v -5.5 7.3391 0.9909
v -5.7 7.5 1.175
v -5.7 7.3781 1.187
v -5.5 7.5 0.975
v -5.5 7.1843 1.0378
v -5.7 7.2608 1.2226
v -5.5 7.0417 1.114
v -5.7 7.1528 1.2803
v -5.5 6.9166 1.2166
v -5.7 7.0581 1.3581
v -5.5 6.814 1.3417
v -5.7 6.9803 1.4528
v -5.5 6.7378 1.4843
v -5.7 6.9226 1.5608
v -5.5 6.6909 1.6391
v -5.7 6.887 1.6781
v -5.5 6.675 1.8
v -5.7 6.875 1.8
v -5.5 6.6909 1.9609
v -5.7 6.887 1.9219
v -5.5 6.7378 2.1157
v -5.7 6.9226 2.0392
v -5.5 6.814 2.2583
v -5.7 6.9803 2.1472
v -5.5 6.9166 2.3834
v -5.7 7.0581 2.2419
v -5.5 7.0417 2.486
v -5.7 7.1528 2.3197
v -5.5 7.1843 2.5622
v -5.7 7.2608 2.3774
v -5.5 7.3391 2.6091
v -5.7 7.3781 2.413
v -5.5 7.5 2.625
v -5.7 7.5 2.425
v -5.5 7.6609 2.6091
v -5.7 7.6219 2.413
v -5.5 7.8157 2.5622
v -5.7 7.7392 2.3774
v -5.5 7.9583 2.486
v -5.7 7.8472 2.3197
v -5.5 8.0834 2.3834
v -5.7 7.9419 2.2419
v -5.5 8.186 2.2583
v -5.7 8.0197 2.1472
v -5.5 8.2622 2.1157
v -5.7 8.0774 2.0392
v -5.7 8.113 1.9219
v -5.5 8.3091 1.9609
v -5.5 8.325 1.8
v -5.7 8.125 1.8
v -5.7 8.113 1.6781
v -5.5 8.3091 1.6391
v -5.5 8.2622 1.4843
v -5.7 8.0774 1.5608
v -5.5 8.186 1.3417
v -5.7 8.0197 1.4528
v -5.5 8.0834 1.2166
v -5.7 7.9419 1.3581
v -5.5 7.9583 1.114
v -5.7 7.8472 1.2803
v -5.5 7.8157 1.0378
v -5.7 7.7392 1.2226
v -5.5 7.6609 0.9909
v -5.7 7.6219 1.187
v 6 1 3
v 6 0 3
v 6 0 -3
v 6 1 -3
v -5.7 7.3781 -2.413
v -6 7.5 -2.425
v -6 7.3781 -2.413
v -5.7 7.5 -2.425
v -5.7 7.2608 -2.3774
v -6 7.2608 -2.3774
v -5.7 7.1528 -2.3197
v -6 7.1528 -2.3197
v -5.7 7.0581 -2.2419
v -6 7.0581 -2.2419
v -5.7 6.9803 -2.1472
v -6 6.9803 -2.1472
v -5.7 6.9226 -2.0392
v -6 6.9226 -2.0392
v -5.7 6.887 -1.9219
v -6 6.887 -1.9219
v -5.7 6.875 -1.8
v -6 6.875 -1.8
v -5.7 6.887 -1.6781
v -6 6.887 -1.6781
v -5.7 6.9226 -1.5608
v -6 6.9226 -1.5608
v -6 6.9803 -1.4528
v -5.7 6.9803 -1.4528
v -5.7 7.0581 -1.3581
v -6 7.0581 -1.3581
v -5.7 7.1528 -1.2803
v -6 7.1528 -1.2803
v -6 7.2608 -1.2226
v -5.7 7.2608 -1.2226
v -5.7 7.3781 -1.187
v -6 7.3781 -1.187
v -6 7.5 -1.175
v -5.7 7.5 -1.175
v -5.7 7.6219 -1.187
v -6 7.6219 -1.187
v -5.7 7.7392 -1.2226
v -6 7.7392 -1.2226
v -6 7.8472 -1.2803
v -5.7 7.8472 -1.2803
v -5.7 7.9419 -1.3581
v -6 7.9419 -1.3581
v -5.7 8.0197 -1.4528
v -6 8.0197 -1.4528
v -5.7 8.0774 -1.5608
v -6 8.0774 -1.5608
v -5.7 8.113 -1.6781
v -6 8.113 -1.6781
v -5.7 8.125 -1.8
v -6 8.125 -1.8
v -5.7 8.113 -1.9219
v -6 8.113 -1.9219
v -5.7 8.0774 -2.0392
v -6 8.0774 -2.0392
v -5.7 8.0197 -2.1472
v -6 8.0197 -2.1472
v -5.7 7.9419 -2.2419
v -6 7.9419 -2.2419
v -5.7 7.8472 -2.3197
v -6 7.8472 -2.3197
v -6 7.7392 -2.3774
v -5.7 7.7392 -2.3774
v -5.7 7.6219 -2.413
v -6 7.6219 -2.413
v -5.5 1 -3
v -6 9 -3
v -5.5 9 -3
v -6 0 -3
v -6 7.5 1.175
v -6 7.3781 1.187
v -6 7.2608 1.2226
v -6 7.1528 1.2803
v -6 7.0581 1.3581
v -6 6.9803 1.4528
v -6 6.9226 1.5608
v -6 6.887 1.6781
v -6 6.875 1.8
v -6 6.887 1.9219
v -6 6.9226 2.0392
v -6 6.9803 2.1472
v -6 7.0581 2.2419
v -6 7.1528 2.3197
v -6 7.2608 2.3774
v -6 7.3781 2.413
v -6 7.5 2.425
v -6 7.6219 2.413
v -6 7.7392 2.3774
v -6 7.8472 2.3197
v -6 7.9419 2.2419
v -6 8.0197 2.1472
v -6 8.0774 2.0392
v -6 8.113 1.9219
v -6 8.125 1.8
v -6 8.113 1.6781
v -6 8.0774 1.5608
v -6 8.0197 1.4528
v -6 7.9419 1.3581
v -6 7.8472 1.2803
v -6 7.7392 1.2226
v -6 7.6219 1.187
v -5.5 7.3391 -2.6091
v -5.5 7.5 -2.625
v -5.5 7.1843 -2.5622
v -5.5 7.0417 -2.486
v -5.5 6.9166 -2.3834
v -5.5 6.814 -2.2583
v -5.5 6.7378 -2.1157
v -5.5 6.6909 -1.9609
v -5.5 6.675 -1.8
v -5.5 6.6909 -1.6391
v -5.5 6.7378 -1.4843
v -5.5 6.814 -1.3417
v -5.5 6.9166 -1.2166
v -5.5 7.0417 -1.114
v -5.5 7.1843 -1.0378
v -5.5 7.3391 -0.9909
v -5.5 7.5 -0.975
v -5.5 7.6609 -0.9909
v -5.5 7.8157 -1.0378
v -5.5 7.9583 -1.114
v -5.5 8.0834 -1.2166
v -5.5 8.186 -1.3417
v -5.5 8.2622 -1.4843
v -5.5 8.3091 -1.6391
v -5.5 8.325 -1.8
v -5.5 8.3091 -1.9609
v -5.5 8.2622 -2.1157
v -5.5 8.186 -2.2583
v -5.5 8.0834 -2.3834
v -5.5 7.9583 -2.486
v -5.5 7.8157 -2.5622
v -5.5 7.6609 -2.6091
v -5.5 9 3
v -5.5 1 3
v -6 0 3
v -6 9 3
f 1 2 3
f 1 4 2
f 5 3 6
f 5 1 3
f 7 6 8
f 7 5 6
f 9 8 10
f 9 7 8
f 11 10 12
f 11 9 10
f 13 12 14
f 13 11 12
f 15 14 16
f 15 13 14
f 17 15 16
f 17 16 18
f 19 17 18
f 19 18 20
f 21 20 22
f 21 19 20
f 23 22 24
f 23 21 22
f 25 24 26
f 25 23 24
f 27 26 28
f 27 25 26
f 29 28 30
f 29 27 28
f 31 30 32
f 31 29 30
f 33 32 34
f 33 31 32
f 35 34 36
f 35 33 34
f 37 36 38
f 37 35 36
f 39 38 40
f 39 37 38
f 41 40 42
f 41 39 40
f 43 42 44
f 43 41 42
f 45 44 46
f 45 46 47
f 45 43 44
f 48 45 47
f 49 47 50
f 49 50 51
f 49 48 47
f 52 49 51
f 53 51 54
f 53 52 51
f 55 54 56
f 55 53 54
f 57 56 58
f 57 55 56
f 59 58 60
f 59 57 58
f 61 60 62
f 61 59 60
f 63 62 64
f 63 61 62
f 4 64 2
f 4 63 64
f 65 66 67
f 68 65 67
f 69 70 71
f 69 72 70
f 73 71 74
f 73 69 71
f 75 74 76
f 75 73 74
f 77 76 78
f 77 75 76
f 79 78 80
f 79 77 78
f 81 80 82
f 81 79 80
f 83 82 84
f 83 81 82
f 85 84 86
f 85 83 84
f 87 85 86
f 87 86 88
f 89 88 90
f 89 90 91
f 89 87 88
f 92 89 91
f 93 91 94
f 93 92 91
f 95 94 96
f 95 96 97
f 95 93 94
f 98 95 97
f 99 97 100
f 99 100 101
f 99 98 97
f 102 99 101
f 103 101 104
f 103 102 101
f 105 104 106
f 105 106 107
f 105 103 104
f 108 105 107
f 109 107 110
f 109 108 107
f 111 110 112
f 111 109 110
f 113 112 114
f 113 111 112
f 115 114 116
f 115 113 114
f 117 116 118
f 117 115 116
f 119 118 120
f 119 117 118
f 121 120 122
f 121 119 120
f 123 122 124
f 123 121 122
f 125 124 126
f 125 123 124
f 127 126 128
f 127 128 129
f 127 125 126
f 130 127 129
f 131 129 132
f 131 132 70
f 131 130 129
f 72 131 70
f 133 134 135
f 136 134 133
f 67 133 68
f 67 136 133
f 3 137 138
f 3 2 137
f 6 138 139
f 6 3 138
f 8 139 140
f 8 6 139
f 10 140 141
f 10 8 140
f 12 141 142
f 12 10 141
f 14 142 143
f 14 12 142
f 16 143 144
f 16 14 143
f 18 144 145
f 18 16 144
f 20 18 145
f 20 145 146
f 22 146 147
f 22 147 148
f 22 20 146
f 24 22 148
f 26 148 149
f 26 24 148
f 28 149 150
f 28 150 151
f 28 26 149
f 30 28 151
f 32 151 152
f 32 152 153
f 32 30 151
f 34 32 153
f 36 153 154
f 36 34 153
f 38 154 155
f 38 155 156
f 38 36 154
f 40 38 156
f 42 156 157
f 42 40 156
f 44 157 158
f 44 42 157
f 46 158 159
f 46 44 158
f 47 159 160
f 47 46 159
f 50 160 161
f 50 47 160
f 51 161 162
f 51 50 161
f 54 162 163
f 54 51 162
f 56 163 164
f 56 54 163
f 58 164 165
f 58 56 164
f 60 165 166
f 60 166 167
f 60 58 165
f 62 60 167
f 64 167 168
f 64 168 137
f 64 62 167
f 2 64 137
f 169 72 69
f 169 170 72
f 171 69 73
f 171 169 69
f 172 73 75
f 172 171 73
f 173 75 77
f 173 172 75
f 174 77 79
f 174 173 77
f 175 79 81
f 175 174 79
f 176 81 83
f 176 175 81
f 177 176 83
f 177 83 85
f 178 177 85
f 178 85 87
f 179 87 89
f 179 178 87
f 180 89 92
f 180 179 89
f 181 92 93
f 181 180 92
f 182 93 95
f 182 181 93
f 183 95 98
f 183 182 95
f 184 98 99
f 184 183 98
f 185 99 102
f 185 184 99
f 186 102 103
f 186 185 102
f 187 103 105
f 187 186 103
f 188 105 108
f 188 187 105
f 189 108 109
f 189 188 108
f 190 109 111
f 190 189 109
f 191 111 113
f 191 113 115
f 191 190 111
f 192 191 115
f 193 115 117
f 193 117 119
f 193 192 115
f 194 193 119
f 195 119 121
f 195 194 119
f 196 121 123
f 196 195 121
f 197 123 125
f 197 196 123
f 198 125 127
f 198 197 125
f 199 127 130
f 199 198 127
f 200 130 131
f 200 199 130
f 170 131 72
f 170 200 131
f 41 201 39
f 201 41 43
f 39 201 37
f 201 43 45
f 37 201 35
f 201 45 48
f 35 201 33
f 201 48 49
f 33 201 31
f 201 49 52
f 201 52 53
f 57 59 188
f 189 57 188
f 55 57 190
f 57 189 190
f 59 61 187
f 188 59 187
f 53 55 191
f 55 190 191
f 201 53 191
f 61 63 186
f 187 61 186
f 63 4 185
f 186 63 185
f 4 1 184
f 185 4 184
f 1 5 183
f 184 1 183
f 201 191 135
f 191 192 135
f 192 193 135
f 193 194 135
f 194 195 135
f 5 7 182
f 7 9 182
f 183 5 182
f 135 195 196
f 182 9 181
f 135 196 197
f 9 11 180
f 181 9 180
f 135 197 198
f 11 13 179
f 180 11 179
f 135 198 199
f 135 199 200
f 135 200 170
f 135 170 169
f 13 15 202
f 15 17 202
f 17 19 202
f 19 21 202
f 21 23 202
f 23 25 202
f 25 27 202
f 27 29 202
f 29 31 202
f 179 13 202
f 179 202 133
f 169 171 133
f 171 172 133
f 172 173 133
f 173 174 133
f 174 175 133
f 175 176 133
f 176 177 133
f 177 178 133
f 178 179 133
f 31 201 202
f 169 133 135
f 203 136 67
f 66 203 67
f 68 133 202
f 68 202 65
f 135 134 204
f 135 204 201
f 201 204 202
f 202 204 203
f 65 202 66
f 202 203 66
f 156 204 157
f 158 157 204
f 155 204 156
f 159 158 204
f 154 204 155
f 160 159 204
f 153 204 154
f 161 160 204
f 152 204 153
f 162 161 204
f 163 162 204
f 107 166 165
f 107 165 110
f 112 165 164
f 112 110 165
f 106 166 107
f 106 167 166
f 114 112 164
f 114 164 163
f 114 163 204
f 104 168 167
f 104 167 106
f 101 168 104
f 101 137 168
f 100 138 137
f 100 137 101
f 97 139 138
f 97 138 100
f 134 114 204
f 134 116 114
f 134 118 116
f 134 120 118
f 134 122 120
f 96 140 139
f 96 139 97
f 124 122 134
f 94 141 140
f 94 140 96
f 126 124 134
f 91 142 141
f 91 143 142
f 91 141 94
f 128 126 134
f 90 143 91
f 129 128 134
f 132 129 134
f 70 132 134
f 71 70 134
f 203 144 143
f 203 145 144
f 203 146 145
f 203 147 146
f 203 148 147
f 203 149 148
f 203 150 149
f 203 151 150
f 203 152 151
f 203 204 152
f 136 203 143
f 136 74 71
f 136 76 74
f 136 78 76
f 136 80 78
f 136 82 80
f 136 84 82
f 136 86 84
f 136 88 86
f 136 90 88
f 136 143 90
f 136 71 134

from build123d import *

# Parameters (mm, degrees)
SKETCH_1_W                    = 12
SKETCH_1_H                    = 6
EXTRUDE_1_DEPTH               = 1
SKETCH_2_W                    = 0.5
SKETCH_2_H                    = 6
EXTRUDE_2_DEPTH               = 8
HOLE_WIZARD_M1_6_1_AT_2_COUNT = 2
HOLE_WIZARD_M1_6_1_AT_2_PITCH = 3.6


with BuildPart() as part:
    # 草图1 → 凸台-拉伸1 (new body)
    with BuildSketch(Plane(origin=(0, 0, 0), x_dir=(1, 0, 0), z_dir=(0, 1, 0))):
        Rectangle(SKETCH_1_W, SKETCH_1_H)
    extrude(amount=EXTRUDE_1_DEPTH)

    # 草图2 → 凸台-拉伸2 (add)
    with BuildSketch(Plane(origin=(0, 1, 0), x_dir=(1, 0, 0), z_dir=(0, 1, 0))):
        with Locations((-5.75, 0)):
            Rectangle(SKETCH_2_W, SKETCH_2_H)
    extrude(amount=EXTRUDE_2_DEPTH)

    # 草图5 → M1.6 螺纹孔1 (revolve, cut)
    with BuildSketch(Plane(origin=(-5.5, 7.5, -1.8), x_dir=(0, 0, -1), z_dir=(0, 1, 0))):
        Polygon((0, 0), (0, 0.5), (0.625, 0.5), (0.625, 0.2), (0.825, 0), align=None)
    hole_wizard_m1_6_1 = revolve(axis=Axis((0.85, 7.5, -1.8), (-1, 0, 0)), mode=Mode.SUBTRACT)

    # M1.6 螺纹孔1 at 2: M1.6 螺纹孔1 ×2
    with Locations(*[(0, 0, i * HOLE_WIZARD_M1_6_1_AT_2_PITCH) for i in range(1, HOLE_WIZARD_M1_6_1_AT_2_COUNT)]):
        add(hole_wizard_m1_6_1, mode=Mode.SUBTRACT)


solid = part.part
